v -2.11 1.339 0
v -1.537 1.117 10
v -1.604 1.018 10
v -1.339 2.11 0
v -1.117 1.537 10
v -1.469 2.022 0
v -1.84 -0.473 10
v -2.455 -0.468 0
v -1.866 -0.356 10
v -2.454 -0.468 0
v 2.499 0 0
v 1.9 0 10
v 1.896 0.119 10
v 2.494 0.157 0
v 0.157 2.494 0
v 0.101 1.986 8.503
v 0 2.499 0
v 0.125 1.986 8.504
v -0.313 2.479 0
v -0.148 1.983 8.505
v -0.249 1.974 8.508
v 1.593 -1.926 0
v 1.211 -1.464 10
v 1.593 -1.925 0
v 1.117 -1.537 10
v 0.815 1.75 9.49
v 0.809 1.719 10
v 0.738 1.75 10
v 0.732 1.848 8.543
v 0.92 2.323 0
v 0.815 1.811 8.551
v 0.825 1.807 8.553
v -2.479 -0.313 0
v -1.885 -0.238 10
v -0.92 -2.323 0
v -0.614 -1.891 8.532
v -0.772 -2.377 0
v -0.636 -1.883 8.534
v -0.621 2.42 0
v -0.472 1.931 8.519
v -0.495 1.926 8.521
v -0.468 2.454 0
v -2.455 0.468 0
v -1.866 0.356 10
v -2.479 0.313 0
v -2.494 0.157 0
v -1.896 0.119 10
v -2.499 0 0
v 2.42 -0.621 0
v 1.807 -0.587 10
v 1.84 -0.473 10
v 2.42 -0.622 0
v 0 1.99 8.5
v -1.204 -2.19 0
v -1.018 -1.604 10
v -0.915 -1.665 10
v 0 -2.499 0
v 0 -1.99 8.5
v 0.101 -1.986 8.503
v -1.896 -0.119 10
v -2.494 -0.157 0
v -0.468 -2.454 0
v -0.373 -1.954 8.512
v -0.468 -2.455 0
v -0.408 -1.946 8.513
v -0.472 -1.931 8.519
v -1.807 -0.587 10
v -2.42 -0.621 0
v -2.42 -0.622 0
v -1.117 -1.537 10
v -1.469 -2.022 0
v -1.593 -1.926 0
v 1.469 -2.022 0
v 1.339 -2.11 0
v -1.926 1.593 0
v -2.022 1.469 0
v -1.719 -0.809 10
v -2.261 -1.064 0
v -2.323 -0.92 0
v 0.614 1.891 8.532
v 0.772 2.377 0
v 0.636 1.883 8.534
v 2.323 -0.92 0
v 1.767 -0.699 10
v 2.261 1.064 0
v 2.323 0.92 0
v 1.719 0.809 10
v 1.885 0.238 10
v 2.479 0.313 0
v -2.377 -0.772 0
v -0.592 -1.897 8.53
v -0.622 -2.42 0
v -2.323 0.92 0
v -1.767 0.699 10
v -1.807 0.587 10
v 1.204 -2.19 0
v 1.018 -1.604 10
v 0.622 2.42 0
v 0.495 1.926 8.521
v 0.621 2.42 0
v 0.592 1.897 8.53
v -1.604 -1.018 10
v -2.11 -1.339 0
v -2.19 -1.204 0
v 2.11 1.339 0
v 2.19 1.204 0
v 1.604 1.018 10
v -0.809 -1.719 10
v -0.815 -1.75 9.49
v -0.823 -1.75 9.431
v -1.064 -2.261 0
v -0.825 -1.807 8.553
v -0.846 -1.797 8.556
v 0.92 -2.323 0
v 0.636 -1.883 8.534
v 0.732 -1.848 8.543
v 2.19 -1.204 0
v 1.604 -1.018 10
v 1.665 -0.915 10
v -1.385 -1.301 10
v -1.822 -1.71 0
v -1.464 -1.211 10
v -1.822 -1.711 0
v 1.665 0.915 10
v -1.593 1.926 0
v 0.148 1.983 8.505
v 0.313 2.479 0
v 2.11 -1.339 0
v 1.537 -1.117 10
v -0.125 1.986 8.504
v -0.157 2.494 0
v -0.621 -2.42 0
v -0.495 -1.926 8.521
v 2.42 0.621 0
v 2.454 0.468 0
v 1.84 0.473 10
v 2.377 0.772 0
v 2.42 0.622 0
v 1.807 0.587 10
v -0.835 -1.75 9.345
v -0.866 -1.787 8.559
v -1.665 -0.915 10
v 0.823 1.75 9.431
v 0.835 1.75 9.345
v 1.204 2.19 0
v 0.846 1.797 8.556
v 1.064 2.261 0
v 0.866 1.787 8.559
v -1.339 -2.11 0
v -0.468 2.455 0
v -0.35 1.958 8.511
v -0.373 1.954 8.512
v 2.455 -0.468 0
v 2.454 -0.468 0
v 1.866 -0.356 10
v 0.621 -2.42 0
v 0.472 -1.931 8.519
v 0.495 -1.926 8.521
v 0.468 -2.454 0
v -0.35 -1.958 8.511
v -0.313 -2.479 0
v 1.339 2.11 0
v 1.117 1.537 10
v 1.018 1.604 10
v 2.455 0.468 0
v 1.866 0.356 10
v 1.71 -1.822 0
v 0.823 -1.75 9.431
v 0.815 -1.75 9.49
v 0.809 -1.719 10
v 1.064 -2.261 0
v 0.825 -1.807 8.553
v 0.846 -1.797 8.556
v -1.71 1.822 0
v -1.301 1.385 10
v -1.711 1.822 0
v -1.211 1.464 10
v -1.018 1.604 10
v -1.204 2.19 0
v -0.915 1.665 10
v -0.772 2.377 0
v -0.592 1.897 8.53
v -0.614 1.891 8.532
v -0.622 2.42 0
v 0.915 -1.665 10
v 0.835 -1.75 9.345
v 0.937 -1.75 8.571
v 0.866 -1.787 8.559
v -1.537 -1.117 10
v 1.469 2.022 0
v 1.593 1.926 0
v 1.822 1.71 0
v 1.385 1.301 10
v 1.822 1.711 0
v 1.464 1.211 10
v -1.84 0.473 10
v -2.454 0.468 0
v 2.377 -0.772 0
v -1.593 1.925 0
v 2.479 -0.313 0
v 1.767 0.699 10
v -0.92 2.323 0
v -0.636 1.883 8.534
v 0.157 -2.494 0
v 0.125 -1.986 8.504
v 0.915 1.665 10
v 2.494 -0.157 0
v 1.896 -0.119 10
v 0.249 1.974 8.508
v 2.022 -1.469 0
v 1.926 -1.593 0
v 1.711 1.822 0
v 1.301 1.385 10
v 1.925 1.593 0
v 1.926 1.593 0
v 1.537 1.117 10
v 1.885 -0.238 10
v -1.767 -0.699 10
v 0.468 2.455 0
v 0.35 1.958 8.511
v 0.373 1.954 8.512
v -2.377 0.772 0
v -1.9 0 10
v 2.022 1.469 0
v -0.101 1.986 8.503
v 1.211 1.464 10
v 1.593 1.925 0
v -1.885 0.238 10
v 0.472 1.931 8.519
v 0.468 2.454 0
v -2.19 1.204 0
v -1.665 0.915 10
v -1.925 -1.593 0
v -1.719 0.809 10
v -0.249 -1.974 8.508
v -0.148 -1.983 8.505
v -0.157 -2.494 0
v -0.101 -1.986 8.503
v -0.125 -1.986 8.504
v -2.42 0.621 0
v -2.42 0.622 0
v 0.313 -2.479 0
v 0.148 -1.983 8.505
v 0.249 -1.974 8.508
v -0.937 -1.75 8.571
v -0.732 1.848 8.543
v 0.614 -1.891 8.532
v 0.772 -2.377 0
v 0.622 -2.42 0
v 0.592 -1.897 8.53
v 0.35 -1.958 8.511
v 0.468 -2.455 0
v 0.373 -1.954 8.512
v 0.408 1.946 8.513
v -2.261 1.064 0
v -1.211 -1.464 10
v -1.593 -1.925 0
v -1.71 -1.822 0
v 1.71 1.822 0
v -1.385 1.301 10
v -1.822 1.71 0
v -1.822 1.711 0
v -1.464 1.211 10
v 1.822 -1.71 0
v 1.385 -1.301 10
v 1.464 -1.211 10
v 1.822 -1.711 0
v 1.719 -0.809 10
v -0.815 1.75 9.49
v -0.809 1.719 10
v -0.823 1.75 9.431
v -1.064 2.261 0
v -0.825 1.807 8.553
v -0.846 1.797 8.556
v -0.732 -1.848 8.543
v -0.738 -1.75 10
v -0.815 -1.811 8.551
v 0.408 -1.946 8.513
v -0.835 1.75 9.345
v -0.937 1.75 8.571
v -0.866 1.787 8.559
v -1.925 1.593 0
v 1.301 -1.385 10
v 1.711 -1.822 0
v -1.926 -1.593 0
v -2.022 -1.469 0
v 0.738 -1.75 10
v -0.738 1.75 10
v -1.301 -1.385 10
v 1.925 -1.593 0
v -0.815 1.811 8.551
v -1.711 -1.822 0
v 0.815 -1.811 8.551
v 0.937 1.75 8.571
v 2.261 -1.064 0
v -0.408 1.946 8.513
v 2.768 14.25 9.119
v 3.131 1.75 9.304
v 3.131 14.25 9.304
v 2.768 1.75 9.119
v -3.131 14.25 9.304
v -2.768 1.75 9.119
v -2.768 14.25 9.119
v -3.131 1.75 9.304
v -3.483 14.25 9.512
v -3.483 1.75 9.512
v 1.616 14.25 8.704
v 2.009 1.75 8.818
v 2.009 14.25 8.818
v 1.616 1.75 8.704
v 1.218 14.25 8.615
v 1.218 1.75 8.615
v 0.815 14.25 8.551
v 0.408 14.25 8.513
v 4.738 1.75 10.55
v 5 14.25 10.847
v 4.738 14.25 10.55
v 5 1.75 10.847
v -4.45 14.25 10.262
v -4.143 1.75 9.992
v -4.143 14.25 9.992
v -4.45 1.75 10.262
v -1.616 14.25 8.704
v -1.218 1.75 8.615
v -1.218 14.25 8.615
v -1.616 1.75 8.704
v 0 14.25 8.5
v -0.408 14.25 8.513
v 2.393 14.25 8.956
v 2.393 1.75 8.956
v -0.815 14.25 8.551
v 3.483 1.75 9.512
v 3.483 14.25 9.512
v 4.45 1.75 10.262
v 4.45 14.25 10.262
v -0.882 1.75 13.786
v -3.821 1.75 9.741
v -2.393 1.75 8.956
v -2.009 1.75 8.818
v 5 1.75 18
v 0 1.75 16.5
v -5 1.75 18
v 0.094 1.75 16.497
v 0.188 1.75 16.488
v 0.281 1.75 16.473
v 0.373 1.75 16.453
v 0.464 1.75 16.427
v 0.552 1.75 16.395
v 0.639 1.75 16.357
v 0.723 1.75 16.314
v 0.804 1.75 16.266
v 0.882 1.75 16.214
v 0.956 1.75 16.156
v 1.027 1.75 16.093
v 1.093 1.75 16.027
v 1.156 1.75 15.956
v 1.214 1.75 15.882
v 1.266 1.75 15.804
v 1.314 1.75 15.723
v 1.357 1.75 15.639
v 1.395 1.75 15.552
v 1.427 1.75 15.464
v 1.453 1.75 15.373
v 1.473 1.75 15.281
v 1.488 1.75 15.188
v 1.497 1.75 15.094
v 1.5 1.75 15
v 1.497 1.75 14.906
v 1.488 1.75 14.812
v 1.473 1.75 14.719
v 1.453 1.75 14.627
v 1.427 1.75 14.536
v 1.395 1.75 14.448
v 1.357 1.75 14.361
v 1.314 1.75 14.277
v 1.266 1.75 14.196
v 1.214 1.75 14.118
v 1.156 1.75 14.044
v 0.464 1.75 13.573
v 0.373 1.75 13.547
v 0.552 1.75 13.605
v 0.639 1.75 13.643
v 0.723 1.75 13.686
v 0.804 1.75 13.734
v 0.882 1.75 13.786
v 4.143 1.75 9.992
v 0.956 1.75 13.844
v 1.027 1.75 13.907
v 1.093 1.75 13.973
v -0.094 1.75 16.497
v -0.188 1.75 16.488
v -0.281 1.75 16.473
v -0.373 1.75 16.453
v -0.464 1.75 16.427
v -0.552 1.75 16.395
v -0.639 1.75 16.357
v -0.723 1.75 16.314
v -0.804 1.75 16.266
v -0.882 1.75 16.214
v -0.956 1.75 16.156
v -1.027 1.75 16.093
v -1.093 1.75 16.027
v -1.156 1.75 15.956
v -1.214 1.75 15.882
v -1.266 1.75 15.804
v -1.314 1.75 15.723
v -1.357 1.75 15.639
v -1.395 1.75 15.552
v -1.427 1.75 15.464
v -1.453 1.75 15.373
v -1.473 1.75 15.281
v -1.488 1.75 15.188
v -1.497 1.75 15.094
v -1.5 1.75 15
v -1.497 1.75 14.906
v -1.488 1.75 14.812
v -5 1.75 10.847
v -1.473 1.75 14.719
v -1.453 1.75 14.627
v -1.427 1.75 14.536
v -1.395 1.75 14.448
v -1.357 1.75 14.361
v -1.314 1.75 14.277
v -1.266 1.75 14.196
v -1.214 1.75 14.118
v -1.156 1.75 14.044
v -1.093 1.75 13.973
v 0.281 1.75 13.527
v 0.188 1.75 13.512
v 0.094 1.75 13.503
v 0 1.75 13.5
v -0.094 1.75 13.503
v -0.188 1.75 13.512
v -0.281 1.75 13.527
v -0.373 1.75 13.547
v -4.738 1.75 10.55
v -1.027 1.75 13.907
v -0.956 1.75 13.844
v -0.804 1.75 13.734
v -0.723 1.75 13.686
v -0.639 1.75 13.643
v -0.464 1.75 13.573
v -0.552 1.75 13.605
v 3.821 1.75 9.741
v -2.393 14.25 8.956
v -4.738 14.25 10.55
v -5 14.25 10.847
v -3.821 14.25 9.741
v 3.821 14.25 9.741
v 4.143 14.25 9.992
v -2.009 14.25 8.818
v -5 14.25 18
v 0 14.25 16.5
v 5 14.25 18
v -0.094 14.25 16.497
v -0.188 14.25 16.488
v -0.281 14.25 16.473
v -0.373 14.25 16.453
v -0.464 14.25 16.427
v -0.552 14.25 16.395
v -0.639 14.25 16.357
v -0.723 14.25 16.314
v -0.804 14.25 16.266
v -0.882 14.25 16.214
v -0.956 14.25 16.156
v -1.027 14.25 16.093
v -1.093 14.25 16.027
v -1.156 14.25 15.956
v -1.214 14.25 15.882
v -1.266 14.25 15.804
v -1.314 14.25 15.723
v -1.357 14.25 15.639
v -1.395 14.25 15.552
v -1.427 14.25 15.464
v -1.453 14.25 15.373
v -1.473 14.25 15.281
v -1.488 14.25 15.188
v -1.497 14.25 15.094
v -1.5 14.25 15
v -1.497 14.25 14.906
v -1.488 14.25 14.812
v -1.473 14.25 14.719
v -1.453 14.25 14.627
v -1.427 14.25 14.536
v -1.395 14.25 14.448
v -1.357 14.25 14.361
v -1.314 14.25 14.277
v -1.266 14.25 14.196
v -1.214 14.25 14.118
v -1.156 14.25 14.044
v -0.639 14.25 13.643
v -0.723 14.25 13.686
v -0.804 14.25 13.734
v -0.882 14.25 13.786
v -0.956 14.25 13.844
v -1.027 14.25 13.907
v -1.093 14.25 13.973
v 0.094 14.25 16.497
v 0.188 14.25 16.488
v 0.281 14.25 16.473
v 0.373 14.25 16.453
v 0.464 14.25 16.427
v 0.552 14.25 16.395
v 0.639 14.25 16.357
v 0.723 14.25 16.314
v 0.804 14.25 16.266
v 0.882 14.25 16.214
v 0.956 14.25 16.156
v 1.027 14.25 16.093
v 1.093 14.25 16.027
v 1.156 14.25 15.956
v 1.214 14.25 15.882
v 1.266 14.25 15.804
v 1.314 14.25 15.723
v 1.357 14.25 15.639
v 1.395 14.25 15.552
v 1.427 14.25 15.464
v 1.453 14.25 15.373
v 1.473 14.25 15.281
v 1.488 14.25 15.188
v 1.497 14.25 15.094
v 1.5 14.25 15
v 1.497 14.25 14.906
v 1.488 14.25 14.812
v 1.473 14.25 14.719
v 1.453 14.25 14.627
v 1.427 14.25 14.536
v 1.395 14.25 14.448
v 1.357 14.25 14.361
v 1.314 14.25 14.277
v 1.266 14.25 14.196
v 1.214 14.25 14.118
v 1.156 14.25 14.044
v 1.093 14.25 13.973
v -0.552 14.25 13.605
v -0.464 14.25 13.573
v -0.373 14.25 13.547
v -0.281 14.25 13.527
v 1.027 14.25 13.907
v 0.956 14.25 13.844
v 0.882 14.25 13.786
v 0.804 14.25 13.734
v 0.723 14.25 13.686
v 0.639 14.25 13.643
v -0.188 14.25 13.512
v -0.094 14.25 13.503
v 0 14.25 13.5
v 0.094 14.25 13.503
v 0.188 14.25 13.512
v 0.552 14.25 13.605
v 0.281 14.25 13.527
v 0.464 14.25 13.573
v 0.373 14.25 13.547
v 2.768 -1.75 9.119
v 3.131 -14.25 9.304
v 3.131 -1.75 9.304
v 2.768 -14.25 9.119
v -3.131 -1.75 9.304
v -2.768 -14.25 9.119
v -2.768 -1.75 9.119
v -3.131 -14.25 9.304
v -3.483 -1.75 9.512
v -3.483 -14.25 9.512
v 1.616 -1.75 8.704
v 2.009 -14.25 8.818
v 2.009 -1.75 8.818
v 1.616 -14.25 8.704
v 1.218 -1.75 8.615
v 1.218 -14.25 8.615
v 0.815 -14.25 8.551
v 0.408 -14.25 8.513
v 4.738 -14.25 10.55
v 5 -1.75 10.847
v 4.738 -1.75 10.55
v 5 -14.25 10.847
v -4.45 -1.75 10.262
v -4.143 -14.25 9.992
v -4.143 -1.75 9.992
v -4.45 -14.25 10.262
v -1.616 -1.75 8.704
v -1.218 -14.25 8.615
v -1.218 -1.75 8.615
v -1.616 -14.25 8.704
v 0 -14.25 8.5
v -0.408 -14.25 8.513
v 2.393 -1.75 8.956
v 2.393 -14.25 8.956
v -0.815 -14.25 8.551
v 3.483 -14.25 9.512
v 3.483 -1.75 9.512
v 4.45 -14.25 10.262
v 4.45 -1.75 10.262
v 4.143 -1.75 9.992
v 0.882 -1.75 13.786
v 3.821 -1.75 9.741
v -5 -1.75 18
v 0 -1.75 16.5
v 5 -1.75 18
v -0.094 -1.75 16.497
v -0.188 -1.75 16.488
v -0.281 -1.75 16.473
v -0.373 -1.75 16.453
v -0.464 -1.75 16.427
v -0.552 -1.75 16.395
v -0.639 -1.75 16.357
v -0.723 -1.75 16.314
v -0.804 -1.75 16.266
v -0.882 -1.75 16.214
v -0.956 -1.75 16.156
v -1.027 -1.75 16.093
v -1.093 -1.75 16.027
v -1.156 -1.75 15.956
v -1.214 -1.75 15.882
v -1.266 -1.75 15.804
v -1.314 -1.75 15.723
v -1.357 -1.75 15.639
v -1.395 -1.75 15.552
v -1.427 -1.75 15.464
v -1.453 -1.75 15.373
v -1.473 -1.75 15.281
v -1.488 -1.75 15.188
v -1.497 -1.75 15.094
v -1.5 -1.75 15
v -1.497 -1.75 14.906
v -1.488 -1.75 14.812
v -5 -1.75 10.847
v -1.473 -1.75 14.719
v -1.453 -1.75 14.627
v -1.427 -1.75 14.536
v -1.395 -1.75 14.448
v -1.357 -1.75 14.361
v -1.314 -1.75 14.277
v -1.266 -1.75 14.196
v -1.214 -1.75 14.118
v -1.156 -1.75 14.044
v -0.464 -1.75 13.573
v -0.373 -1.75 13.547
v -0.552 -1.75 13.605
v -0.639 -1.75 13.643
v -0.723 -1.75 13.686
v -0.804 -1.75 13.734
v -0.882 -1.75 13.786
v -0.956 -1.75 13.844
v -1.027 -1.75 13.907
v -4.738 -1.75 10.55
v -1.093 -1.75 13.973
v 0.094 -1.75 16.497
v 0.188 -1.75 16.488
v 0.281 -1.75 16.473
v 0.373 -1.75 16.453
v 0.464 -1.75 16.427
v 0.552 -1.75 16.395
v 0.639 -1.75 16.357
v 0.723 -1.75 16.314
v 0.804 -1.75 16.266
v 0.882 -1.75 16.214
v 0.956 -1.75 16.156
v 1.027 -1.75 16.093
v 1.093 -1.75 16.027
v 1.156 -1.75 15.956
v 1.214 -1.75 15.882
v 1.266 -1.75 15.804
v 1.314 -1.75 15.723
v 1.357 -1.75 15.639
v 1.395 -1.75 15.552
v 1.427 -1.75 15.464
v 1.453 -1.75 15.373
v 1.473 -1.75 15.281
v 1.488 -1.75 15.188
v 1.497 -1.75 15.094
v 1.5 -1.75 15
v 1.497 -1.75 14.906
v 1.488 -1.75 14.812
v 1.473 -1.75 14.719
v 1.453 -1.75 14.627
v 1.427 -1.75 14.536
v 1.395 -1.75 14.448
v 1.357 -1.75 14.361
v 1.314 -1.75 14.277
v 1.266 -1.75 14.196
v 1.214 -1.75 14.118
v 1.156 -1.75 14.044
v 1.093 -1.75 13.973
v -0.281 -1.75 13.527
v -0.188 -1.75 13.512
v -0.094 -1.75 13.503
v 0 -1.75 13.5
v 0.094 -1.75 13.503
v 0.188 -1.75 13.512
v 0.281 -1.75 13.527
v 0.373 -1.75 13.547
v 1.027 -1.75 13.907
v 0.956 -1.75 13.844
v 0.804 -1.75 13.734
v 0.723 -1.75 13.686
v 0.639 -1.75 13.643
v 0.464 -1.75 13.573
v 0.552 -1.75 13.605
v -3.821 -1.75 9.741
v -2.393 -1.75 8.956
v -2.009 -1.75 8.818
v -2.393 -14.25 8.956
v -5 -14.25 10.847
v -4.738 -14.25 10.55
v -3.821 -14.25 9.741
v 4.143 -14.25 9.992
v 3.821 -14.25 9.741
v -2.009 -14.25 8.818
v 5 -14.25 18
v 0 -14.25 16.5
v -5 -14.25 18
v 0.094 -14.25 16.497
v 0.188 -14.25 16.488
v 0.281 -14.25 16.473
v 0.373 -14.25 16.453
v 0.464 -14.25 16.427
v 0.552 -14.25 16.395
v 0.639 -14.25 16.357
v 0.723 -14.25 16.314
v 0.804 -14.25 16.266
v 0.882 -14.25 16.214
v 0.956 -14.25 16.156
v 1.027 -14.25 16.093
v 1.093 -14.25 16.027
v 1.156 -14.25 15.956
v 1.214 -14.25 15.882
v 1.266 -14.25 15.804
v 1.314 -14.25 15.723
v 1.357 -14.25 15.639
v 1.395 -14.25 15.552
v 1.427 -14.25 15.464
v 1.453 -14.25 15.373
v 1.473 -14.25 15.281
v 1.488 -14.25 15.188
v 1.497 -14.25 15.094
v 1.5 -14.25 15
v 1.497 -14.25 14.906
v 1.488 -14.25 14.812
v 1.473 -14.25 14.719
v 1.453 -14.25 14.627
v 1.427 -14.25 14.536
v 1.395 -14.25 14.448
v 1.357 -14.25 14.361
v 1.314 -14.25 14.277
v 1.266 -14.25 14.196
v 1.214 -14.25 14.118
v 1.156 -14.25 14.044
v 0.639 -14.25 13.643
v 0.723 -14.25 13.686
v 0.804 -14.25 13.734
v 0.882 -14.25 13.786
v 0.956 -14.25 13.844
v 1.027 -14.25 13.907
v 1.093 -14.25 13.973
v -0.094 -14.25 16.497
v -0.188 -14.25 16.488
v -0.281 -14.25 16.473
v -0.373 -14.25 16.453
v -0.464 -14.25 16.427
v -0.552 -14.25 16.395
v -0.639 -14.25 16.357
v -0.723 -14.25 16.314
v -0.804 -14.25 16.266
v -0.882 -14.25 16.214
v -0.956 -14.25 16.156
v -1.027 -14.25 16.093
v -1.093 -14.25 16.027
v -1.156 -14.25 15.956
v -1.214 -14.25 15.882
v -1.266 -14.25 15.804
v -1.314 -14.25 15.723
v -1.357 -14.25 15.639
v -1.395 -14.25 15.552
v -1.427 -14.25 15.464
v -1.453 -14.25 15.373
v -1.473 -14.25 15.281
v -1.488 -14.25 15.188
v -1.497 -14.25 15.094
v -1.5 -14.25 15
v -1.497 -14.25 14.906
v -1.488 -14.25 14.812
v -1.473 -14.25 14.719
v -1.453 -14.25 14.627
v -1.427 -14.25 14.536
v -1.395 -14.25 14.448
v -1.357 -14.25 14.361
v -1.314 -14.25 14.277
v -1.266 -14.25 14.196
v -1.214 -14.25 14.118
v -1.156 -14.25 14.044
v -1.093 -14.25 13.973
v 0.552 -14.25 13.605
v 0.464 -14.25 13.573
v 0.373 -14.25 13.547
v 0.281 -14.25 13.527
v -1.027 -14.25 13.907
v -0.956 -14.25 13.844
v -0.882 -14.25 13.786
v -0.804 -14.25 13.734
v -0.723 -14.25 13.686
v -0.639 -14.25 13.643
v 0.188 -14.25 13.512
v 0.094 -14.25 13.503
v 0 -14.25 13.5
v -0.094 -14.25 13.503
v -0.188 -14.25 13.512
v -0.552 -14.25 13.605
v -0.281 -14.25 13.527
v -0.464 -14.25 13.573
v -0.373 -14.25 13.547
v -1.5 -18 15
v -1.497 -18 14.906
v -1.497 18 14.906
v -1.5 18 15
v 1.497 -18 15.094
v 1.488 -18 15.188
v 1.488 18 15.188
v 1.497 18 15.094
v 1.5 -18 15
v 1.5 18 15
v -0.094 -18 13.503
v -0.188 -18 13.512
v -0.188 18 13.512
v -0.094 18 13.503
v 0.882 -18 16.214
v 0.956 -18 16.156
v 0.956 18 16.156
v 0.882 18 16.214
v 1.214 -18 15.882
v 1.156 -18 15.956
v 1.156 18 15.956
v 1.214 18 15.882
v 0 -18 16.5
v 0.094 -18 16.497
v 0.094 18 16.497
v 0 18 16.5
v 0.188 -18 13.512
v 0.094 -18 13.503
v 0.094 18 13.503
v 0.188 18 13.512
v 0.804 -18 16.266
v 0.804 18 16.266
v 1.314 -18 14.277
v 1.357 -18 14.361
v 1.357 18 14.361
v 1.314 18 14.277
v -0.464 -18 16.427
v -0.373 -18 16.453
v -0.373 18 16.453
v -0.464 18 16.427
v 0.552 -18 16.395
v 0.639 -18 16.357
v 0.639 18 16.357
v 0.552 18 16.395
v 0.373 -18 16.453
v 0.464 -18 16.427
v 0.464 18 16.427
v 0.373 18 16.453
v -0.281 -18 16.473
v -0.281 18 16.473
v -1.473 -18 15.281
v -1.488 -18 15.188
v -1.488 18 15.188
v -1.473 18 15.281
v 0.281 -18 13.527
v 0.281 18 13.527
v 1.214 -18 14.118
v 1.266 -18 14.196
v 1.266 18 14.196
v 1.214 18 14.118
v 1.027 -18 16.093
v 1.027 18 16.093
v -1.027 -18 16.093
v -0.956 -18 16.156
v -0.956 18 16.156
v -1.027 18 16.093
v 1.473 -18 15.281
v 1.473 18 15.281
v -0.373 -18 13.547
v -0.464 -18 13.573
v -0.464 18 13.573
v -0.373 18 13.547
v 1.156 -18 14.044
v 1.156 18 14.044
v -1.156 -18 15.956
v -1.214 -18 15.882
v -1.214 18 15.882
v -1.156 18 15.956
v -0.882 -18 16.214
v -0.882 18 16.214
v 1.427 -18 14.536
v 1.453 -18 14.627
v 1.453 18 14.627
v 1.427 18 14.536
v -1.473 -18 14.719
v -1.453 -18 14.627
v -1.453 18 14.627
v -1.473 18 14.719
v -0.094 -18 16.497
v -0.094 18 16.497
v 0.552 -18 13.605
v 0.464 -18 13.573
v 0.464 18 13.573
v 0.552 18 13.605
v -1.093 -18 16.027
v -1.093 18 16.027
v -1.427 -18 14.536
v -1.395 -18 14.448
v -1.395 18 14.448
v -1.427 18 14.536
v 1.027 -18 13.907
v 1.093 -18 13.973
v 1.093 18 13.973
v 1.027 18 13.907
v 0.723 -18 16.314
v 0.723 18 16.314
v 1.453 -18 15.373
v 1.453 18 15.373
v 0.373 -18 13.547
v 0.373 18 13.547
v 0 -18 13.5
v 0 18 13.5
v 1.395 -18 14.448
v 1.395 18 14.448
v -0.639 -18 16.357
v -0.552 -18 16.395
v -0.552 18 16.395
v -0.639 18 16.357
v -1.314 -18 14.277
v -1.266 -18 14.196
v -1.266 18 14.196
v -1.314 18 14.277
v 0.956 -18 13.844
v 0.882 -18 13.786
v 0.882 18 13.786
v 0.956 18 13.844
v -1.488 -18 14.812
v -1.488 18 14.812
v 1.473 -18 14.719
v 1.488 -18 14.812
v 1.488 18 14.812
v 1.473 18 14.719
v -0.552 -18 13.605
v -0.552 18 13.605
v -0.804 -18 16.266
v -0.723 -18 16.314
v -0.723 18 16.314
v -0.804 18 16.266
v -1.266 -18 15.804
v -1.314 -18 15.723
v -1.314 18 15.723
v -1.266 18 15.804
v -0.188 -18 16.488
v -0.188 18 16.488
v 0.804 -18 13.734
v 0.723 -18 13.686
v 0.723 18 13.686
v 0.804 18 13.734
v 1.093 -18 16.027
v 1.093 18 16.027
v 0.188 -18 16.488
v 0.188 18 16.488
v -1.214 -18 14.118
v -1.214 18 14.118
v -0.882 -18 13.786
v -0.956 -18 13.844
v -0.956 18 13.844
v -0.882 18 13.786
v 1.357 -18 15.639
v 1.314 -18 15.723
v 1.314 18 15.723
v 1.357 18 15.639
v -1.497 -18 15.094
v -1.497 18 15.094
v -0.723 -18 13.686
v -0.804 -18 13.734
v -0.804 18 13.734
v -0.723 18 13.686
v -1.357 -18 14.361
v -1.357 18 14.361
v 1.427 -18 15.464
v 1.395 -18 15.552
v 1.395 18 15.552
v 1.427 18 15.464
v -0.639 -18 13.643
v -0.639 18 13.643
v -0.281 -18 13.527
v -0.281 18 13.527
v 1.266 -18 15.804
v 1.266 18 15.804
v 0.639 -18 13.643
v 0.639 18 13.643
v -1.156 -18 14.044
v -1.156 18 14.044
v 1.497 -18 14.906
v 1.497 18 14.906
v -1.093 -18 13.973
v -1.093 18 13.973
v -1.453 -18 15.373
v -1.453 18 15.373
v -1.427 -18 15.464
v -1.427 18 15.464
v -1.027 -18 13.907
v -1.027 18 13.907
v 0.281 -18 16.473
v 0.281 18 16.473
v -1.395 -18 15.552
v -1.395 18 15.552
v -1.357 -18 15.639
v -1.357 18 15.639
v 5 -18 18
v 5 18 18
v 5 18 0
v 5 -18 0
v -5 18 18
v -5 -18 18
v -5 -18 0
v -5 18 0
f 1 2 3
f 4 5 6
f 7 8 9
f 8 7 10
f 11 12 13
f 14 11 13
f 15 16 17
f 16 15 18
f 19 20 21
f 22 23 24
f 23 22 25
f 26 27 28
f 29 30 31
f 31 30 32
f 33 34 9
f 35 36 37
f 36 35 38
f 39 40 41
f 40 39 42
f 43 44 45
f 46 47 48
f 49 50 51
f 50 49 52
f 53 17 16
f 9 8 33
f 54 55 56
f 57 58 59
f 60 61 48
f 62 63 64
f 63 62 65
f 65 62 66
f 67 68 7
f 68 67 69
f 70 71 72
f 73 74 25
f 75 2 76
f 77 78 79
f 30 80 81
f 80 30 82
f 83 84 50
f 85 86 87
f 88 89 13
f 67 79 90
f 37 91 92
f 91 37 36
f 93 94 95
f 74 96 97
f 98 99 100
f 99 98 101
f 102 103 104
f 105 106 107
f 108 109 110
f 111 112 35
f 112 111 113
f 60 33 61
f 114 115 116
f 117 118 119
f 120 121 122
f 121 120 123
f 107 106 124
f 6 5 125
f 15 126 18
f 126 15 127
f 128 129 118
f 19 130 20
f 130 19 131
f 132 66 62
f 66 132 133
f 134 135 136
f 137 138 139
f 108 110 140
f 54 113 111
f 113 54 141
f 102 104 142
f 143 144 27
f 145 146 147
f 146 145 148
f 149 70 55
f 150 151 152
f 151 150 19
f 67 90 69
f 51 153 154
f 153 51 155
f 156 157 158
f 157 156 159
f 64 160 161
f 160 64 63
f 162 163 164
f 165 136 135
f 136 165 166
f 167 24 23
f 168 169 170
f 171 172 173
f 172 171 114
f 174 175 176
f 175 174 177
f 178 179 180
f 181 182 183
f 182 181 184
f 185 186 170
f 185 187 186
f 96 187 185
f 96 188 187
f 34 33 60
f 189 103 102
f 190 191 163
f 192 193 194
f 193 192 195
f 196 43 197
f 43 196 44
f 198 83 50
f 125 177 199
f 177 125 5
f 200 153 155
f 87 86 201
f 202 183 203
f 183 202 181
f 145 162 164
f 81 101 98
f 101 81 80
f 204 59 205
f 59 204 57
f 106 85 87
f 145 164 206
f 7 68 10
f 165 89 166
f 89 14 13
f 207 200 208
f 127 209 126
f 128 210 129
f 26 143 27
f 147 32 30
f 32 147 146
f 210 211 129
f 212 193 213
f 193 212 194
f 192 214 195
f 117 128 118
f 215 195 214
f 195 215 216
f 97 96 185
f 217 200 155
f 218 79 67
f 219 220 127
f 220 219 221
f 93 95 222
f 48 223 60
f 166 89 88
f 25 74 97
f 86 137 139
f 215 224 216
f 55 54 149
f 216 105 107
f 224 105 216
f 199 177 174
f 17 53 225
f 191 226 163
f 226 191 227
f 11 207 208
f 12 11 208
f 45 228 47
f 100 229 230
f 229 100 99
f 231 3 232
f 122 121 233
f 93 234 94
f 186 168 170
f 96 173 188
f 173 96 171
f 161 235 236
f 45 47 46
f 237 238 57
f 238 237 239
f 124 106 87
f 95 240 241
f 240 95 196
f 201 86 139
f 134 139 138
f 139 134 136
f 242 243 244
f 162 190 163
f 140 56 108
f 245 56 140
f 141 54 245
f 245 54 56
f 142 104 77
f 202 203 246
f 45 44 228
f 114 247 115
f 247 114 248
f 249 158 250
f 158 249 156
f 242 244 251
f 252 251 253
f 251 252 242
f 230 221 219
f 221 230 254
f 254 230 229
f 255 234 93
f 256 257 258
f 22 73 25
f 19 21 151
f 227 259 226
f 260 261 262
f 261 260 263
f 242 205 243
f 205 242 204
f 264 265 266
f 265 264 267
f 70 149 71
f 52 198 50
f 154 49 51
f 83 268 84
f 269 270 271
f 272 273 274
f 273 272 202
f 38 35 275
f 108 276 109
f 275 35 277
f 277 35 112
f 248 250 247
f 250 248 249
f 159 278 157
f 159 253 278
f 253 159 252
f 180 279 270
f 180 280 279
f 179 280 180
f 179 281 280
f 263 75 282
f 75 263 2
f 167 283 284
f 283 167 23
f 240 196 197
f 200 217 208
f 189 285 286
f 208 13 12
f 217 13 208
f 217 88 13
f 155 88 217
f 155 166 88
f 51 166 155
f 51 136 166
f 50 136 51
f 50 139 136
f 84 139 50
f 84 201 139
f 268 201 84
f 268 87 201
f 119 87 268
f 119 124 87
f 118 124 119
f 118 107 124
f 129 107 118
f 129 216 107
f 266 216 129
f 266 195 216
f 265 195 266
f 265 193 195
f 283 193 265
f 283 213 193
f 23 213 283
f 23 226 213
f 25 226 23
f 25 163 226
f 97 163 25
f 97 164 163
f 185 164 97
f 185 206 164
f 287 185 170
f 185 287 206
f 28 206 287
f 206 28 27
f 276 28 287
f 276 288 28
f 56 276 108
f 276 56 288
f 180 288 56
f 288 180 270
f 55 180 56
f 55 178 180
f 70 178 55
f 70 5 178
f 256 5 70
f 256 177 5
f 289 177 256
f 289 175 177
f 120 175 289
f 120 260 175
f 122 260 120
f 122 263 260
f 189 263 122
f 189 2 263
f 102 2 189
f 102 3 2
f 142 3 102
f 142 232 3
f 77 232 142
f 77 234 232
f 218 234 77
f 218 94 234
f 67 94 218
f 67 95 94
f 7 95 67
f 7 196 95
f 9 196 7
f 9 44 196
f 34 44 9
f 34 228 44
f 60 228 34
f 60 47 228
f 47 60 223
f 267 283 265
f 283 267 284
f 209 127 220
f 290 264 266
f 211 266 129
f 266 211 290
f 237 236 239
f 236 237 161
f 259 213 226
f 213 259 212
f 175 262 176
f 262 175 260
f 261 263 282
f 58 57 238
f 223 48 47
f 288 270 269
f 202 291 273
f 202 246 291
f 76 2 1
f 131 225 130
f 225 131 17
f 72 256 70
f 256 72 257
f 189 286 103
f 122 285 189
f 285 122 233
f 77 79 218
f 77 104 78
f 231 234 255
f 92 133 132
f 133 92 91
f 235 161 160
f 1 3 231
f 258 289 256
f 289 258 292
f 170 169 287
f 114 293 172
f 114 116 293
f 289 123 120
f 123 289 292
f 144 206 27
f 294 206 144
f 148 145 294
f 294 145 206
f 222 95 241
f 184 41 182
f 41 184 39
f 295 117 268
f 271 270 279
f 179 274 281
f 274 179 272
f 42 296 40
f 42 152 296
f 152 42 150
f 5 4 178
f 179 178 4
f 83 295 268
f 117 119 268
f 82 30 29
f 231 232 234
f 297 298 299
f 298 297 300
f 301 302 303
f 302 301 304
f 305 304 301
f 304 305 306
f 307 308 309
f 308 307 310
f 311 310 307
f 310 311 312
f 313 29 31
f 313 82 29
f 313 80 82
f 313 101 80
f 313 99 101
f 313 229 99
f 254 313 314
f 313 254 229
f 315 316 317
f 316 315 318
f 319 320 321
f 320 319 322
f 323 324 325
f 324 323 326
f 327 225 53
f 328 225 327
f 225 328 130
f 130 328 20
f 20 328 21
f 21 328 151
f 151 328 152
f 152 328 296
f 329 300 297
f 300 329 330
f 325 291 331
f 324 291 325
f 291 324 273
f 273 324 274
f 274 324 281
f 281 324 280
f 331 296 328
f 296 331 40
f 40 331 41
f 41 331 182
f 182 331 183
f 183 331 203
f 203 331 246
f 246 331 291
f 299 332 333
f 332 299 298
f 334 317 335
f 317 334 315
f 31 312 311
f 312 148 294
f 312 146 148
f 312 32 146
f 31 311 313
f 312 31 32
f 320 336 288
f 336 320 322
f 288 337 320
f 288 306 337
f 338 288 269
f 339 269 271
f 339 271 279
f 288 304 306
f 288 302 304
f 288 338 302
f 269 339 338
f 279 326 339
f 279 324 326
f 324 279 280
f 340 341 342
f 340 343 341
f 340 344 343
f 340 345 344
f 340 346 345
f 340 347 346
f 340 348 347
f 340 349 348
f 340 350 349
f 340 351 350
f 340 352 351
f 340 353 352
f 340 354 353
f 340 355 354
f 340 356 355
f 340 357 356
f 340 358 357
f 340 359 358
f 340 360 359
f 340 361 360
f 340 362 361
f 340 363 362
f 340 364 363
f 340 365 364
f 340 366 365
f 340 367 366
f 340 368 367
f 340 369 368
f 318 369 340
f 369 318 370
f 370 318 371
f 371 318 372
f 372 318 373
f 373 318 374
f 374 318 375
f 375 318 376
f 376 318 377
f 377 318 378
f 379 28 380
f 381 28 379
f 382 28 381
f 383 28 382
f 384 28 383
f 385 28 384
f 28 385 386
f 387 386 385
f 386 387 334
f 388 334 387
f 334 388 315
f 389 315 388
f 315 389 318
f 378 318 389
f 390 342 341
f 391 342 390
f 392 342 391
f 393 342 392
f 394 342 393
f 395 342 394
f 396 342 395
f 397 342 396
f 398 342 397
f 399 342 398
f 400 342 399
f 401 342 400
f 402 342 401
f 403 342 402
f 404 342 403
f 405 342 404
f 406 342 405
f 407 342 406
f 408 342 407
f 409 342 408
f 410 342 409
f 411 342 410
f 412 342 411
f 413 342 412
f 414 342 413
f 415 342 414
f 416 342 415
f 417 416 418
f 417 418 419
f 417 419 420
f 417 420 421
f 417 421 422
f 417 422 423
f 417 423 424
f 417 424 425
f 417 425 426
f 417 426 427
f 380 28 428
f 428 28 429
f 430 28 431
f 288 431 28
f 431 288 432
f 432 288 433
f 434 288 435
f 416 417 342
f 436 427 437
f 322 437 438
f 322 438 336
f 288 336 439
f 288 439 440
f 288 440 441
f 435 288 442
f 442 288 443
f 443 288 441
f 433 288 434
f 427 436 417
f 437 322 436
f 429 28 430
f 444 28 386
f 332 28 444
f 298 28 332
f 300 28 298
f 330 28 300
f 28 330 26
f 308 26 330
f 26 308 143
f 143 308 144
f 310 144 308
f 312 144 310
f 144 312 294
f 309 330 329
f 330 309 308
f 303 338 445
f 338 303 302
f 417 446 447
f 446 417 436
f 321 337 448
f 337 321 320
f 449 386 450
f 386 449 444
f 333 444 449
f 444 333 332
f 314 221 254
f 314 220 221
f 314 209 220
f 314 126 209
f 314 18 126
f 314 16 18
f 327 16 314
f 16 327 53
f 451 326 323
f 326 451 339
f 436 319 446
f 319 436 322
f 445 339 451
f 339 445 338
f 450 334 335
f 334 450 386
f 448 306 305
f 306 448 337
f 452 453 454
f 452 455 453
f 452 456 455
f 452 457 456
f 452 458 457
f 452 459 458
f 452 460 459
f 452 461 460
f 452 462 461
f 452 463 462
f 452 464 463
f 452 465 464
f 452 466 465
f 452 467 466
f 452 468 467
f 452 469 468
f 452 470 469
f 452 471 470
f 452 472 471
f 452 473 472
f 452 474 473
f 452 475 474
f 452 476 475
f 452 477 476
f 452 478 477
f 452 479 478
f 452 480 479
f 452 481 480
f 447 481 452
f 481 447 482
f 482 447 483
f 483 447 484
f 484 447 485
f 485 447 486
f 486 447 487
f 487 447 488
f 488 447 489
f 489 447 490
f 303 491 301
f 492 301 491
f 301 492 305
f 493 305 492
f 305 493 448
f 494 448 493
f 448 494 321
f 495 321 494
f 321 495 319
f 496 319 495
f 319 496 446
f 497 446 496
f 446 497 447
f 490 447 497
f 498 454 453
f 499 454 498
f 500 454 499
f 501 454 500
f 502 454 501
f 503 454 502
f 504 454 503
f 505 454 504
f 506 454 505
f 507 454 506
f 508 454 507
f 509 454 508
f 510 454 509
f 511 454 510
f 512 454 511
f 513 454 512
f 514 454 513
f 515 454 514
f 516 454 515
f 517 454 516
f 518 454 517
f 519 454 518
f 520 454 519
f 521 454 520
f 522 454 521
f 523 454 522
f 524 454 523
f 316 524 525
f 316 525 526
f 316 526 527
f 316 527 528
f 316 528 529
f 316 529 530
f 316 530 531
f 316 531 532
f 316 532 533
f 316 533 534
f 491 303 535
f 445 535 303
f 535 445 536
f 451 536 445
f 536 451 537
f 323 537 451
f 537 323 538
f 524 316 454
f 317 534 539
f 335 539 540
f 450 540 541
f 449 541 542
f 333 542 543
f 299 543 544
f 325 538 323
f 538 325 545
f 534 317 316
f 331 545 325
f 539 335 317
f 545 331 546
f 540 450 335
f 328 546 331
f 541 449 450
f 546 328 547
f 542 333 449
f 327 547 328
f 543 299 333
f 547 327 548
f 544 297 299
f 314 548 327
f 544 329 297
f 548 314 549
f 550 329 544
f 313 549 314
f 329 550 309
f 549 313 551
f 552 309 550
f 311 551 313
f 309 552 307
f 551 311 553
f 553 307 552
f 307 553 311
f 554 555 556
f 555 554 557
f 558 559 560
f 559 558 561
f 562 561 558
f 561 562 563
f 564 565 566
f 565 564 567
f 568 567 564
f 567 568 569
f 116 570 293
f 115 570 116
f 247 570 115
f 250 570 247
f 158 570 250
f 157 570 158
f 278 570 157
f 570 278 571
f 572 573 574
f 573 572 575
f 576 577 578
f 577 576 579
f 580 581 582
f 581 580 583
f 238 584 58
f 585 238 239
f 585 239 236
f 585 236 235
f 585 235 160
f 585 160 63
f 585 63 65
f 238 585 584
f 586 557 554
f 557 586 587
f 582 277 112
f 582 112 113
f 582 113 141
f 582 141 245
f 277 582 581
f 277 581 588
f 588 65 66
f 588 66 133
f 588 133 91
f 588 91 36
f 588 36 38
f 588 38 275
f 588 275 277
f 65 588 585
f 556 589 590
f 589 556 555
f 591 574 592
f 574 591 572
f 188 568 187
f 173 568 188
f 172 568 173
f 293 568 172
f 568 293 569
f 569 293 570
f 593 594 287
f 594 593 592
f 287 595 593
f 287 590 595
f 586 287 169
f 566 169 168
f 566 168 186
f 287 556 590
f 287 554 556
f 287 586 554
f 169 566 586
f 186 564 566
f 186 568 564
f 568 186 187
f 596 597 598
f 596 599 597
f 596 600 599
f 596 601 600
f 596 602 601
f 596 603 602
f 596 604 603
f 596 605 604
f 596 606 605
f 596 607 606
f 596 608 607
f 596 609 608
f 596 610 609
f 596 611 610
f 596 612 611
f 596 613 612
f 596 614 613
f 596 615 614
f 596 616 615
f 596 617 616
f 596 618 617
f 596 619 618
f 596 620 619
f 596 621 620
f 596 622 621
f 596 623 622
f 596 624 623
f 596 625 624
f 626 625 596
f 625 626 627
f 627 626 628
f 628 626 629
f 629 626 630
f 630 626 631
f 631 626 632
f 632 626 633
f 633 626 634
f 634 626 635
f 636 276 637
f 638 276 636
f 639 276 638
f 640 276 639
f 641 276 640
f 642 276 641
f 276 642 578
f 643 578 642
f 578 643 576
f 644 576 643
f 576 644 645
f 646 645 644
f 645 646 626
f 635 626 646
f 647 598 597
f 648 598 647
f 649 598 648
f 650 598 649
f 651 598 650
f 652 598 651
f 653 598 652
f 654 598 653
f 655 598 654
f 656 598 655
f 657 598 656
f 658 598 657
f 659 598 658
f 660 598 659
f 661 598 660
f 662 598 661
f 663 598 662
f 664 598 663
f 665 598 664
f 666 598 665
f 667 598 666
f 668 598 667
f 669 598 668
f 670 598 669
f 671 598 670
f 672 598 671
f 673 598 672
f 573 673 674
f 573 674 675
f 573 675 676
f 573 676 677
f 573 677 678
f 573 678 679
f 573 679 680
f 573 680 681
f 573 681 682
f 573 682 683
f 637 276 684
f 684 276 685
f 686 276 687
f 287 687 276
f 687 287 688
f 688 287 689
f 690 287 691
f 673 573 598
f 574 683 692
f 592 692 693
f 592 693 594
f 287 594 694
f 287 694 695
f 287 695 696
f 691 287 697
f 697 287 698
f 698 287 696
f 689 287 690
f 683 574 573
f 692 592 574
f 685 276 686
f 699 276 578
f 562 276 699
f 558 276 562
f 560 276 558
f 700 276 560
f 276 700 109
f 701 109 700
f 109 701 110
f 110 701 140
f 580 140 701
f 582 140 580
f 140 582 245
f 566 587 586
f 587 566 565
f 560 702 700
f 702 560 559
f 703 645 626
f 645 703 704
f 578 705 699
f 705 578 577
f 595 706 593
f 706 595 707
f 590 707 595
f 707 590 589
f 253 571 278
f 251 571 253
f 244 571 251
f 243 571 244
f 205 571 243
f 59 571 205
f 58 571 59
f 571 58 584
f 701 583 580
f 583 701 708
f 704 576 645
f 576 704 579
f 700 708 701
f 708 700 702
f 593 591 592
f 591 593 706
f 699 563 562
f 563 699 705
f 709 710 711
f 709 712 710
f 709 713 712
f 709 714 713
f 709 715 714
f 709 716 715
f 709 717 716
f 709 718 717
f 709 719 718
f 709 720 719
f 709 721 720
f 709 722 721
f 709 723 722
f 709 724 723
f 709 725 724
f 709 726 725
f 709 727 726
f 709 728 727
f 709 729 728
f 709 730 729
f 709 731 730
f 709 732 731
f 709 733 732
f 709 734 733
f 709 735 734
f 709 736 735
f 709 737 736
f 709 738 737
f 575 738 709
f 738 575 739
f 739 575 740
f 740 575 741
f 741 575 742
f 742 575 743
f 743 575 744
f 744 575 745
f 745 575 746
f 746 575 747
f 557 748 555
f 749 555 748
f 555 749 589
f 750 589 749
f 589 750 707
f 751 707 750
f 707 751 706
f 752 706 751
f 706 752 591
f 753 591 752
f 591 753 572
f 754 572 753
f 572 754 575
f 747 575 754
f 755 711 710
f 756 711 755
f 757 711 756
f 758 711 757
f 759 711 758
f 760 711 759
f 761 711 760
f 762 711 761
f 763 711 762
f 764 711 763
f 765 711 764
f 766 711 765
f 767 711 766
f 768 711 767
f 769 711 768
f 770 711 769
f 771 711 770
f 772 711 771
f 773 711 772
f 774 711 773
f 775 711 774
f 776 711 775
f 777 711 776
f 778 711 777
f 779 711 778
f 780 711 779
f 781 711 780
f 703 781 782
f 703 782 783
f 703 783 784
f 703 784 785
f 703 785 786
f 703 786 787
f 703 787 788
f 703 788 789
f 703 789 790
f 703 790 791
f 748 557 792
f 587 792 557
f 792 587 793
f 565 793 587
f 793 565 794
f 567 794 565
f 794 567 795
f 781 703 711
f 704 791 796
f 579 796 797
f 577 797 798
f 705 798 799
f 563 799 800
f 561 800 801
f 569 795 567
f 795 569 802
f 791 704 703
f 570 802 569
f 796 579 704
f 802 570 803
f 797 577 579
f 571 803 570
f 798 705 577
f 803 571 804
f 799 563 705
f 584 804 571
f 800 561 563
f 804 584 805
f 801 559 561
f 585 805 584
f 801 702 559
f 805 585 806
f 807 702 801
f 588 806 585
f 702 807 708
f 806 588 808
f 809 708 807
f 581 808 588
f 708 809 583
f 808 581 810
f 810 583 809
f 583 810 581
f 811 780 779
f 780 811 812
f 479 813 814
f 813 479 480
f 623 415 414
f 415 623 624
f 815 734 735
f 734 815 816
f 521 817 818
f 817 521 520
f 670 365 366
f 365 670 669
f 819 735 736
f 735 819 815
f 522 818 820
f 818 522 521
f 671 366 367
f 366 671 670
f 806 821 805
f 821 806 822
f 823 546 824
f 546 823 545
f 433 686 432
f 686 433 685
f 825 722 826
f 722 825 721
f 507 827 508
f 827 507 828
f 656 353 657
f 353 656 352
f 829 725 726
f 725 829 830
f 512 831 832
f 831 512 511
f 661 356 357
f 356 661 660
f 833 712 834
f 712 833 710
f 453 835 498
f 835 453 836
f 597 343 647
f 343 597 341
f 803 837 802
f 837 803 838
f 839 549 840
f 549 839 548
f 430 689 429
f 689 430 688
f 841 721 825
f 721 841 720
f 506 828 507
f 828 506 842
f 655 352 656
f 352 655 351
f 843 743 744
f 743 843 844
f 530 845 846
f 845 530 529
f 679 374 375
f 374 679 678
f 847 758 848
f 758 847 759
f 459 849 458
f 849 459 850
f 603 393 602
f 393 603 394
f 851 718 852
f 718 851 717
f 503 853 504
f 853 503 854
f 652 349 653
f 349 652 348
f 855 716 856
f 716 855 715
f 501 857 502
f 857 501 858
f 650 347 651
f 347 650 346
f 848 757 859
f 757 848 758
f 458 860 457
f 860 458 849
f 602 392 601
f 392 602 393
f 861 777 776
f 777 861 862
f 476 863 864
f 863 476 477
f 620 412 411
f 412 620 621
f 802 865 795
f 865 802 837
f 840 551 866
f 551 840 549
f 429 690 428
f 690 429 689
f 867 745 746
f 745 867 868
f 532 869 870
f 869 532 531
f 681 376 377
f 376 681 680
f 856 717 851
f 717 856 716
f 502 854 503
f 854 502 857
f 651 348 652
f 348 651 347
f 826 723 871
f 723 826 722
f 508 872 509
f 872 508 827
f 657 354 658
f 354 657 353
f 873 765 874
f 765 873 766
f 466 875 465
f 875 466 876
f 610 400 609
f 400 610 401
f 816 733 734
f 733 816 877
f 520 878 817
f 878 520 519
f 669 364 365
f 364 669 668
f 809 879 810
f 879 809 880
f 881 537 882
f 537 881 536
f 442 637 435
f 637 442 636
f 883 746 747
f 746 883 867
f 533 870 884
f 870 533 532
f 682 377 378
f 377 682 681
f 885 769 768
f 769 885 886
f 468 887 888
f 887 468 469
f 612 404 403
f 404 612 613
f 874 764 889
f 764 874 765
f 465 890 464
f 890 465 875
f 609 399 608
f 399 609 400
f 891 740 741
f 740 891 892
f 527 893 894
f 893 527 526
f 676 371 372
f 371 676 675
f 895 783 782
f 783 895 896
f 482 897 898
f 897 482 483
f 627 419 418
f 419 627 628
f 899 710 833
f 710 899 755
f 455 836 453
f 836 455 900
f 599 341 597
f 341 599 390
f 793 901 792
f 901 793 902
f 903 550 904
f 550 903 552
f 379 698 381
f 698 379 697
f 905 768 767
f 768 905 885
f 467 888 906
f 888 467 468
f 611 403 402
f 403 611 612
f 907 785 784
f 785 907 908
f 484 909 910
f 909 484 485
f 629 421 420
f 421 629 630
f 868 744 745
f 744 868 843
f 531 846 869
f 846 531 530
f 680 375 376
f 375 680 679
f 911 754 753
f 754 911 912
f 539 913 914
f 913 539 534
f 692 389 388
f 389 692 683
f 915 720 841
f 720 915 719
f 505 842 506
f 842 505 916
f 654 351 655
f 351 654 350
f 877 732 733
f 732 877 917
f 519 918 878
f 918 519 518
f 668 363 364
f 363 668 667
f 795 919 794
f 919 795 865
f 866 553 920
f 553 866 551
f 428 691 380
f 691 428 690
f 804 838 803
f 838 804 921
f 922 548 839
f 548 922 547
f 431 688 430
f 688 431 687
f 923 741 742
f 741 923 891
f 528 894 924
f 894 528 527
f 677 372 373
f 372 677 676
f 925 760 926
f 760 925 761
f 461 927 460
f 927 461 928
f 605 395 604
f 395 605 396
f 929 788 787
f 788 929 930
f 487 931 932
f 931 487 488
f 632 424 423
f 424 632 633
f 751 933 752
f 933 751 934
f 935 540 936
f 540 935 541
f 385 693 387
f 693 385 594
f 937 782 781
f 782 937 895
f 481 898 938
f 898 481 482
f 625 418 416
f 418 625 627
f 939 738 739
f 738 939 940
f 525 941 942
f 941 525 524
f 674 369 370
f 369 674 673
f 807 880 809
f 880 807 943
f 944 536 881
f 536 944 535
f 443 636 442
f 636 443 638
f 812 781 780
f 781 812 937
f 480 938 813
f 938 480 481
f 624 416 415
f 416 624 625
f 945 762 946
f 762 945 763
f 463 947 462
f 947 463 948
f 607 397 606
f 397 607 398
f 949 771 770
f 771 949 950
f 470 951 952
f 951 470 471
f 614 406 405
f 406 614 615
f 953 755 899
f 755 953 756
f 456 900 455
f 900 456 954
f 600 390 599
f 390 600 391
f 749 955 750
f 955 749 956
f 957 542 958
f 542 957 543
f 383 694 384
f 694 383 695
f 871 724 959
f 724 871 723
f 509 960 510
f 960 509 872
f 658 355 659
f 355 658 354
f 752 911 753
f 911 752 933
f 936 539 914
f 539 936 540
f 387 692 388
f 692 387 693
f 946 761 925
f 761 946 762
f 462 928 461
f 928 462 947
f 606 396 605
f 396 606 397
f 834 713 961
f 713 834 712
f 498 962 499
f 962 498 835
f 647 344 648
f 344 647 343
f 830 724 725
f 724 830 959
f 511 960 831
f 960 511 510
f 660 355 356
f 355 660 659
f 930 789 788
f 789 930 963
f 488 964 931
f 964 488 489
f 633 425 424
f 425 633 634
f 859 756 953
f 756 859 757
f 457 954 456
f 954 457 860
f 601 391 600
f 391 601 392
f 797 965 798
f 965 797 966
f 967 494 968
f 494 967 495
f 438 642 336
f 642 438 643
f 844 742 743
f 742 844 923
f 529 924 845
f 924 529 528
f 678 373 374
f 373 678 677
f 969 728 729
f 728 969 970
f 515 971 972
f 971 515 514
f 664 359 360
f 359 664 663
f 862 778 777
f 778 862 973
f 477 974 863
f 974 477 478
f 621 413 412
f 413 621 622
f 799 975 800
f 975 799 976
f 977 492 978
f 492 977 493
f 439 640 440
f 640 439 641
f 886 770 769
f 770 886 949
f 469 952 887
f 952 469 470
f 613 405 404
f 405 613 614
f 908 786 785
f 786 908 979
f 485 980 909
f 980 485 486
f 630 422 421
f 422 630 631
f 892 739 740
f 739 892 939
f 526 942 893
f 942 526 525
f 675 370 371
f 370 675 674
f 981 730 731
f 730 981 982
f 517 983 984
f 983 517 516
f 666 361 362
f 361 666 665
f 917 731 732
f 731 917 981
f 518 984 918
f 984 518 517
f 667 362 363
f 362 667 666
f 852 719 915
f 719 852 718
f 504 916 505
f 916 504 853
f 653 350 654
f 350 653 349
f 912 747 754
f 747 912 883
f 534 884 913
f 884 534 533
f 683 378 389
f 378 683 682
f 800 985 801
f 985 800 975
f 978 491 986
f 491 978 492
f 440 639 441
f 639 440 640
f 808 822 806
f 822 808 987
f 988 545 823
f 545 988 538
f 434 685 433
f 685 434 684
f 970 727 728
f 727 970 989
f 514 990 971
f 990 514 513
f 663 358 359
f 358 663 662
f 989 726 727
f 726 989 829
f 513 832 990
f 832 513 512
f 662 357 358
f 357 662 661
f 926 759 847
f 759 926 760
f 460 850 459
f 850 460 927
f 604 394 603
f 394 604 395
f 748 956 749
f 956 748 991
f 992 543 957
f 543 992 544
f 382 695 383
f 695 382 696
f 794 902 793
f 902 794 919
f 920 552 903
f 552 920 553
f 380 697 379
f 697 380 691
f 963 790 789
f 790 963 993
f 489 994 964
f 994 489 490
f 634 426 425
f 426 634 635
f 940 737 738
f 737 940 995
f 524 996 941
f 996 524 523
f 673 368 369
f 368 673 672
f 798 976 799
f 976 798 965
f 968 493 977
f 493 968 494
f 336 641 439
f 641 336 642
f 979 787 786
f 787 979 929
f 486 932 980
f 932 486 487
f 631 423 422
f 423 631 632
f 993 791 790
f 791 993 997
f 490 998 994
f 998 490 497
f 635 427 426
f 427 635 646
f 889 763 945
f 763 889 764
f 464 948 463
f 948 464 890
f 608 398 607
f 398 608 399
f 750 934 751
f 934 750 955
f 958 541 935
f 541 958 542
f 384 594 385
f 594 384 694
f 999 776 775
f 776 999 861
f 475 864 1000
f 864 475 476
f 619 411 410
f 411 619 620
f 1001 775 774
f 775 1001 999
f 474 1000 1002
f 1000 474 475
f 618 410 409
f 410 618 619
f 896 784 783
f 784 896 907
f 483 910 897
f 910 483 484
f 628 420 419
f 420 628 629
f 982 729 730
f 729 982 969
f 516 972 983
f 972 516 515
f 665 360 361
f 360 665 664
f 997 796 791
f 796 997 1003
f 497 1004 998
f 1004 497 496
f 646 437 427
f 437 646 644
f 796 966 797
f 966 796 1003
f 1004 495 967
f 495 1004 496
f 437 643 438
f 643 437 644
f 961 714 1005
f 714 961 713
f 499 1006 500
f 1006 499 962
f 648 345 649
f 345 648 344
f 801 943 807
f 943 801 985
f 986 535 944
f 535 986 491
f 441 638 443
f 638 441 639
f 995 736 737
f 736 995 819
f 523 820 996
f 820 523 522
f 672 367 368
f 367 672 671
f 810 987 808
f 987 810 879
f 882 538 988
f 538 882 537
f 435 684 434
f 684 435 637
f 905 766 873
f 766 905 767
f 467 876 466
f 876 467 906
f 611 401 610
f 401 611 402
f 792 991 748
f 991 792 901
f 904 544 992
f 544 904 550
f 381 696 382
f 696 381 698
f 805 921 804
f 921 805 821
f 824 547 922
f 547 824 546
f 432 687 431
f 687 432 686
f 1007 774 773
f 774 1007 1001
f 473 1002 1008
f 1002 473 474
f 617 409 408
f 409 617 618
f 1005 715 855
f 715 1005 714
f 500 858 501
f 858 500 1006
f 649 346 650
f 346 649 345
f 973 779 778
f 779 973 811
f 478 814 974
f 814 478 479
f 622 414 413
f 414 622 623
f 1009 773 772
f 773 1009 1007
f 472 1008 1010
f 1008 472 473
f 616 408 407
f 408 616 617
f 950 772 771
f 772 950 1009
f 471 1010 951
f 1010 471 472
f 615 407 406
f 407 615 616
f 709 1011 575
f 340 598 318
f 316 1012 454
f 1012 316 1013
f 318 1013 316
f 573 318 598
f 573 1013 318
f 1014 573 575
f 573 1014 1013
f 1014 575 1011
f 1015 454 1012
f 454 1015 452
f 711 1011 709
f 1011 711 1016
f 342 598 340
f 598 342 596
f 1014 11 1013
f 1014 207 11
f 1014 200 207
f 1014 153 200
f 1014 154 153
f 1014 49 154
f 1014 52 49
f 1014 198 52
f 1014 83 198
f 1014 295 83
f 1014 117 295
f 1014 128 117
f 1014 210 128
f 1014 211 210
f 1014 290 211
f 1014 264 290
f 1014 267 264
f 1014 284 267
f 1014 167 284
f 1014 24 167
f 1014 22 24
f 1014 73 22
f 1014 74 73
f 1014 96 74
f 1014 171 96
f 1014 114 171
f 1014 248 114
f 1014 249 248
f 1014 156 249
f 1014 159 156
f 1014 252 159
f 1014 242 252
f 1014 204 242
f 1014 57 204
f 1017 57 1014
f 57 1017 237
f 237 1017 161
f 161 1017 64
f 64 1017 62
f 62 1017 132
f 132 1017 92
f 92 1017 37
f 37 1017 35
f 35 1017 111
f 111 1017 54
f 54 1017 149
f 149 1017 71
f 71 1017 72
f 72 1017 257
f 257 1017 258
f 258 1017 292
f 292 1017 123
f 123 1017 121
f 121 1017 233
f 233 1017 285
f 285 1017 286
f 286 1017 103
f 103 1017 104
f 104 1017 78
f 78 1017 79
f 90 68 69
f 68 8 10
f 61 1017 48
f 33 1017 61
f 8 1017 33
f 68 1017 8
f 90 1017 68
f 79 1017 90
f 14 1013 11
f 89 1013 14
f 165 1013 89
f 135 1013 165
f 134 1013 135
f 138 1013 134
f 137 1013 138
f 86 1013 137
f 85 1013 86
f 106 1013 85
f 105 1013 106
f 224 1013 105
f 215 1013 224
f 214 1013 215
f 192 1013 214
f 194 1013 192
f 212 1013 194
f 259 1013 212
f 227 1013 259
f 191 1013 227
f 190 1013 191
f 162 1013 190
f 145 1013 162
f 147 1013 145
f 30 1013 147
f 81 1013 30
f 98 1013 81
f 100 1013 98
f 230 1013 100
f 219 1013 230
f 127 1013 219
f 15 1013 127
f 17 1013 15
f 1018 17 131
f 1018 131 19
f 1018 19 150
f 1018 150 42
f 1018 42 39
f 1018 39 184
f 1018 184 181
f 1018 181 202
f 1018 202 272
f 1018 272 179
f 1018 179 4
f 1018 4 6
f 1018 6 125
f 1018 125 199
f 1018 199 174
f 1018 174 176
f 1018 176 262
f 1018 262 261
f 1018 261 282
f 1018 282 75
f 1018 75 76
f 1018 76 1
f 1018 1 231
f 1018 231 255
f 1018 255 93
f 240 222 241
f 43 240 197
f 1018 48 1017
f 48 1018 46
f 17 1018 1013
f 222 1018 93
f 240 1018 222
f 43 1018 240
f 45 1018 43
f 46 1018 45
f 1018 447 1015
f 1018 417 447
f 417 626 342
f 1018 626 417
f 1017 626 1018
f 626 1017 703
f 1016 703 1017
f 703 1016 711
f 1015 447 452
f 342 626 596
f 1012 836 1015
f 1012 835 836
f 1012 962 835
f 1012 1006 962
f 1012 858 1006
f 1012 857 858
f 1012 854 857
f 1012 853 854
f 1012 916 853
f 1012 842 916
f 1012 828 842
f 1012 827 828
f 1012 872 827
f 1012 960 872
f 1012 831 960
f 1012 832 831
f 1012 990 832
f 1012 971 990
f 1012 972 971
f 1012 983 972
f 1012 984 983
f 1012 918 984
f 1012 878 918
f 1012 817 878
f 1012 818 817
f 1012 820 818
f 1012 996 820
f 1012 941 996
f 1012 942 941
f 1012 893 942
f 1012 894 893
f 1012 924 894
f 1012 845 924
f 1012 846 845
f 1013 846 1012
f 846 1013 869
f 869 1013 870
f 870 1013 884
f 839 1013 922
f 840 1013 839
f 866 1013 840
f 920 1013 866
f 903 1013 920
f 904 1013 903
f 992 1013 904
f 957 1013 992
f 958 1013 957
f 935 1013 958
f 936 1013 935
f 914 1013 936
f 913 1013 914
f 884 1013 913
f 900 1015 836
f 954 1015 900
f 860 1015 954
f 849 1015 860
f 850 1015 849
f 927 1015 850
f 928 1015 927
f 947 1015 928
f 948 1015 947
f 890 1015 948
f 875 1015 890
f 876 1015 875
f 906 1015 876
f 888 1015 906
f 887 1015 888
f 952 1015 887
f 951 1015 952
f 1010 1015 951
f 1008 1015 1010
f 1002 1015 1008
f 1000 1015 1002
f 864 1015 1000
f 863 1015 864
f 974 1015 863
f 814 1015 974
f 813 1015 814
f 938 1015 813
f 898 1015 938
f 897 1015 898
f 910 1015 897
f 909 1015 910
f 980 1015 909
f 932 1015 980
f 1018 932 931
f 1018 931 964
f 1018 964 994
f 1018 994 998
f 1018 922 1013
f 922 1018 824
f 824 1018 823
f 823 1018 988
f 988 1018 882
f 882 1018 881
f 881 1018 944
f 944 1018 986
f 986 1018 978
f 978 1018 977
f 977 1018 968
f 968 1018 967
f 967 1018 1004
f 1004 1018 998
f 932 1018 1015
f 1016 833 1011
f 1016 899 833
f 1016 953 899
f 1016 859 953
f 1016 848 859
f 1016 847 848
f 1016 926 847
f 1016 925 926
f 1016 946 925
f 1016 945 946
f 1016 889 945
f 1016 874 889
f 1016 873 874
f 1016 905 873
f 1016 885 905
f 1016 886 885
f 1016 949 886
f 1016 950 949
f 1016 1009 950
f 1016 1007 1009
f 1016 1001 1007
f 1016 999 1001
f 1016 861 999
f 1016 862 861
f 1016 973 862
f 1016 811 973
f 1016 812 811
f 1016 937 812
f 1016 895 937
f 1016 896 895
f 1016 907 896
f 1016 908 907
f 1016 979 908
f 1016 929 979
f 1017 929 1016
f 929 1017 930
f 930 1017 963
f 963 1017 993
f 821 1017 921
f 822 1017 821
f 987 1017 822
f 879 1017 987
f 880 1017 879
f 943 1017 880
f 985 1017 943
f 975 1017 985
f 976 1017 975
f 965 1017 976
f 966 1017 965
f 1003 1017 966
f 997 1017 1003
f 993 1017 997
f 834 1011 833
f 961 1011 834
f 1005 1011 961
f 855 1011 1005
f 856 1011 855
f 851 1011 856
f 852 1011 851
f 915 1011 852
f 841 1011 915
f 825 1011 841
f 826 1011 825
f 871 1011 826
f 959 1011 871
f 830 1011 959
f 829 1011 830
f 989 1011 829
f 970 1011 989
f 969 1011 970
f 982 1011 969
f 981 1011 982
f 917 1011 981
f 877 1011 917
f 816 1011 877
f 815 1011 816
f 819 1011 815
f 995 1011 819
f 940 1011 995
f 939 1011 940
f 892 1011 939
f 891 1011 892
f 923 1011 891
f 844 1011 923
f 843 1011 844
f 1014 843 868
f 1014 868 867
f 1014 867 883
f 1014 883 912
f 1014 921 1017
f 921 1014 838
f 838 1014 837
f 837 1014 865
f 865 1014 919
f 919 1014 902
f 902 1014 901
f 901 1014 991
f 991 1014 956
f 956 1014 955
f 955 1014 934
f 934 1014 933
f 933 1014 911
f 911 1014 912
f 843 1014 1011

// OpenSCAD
difference()
{
    union()
        {   
            h = 18;
            translate ([0,0,h/2])cube ([10,36,h],center = true);

        }
    union()
        {
            translate ([0,0,4.99]) cylinder (h=10.02, d1=5, d2=3.8, center= true, $fn=100);
            
            translate ([0,4,15])rotate ([90,0,0]) cylinder (h=4.5, d=13, center = true, $fn=100);
            translate ([0,4,15+1])rotate ([90,0,0]) cylinder (h=4.5, d=13, center = true, $fn=100);
            translate ([0,4,15+2])rotate ([90,0,0]) cylinder (h=4.5, d=13, center = true, $fn=100);
            translate ([0,8,15])rotate ([90,0,0]) cylinder (h=4.5, d=13, center = true, $fn=100);
            translate ([0,8,15+1])rotate ([90,0,0]) cylinder (h=4.5, d=13, center = true, $fn=100);
            translate ([0,8,15+2])rotate ([90,0,0]) cylinder (h=4.5, d=13, center = true, $fn=100);
            translate ([0,12,15])rotate ([90,0,0]) cylinder (h=4.5, d=13, center = true, $fn=100);
            translate ([0,12,15+1])rotate ([90,0,0]) cylinder (h=4.5, d=13, center = true, $fn=100);
            translate ([0,12,15+2])rotate ([90,0,0]) cylinder (h=4.5, d=13, center = true, $fn=100);
            
            translate ([0,-4,15])rotate ([90,0,0]) cylinder (h=4.5, d=13, center = true, $fn=100);
            translate ([0,-4,15+1])rotate ([90,0,0]) cylinder (h=4.5, d=13, center = true, $fn=100);
            translate ([0,-4,15+2])rotate ([90,0,0]) cylinder (h=4.5, d=13, center = true, $fn=100);
            translate ([0,-8,15])rotate ([90,0,0]) cylinder (h=4.5, d=13, center = true, $fn=100);
            translate ([0,-8,15+1])rotate ([90,0,0]) cylinder (h=4.5, d=13, center = true, $fn=100);
            translate ([0,-8,15+2])rotate ([90,0,0]) cylinder (h=4.5, d=13, center = true, $fn=100);
            translate ([0,-12,15])rotate ([90,0,0]) cylinder (h=4.5, d=13, center = true, $fn=100);
            translate ([0,-12,15+1])rotate ([90,0,0]) cylinder (h=4.5, d=13, center = true, $fn=100);
            translate ([0,-12,15+2])rotate ([90,0,0]) cylinder (h=4.5, d=13, center = true, $fn=100);
            translate ([0,0,15])rotate ([90,0,0]) cylinder (h=50, d=3, center = true, $fn=100);

        }
}
